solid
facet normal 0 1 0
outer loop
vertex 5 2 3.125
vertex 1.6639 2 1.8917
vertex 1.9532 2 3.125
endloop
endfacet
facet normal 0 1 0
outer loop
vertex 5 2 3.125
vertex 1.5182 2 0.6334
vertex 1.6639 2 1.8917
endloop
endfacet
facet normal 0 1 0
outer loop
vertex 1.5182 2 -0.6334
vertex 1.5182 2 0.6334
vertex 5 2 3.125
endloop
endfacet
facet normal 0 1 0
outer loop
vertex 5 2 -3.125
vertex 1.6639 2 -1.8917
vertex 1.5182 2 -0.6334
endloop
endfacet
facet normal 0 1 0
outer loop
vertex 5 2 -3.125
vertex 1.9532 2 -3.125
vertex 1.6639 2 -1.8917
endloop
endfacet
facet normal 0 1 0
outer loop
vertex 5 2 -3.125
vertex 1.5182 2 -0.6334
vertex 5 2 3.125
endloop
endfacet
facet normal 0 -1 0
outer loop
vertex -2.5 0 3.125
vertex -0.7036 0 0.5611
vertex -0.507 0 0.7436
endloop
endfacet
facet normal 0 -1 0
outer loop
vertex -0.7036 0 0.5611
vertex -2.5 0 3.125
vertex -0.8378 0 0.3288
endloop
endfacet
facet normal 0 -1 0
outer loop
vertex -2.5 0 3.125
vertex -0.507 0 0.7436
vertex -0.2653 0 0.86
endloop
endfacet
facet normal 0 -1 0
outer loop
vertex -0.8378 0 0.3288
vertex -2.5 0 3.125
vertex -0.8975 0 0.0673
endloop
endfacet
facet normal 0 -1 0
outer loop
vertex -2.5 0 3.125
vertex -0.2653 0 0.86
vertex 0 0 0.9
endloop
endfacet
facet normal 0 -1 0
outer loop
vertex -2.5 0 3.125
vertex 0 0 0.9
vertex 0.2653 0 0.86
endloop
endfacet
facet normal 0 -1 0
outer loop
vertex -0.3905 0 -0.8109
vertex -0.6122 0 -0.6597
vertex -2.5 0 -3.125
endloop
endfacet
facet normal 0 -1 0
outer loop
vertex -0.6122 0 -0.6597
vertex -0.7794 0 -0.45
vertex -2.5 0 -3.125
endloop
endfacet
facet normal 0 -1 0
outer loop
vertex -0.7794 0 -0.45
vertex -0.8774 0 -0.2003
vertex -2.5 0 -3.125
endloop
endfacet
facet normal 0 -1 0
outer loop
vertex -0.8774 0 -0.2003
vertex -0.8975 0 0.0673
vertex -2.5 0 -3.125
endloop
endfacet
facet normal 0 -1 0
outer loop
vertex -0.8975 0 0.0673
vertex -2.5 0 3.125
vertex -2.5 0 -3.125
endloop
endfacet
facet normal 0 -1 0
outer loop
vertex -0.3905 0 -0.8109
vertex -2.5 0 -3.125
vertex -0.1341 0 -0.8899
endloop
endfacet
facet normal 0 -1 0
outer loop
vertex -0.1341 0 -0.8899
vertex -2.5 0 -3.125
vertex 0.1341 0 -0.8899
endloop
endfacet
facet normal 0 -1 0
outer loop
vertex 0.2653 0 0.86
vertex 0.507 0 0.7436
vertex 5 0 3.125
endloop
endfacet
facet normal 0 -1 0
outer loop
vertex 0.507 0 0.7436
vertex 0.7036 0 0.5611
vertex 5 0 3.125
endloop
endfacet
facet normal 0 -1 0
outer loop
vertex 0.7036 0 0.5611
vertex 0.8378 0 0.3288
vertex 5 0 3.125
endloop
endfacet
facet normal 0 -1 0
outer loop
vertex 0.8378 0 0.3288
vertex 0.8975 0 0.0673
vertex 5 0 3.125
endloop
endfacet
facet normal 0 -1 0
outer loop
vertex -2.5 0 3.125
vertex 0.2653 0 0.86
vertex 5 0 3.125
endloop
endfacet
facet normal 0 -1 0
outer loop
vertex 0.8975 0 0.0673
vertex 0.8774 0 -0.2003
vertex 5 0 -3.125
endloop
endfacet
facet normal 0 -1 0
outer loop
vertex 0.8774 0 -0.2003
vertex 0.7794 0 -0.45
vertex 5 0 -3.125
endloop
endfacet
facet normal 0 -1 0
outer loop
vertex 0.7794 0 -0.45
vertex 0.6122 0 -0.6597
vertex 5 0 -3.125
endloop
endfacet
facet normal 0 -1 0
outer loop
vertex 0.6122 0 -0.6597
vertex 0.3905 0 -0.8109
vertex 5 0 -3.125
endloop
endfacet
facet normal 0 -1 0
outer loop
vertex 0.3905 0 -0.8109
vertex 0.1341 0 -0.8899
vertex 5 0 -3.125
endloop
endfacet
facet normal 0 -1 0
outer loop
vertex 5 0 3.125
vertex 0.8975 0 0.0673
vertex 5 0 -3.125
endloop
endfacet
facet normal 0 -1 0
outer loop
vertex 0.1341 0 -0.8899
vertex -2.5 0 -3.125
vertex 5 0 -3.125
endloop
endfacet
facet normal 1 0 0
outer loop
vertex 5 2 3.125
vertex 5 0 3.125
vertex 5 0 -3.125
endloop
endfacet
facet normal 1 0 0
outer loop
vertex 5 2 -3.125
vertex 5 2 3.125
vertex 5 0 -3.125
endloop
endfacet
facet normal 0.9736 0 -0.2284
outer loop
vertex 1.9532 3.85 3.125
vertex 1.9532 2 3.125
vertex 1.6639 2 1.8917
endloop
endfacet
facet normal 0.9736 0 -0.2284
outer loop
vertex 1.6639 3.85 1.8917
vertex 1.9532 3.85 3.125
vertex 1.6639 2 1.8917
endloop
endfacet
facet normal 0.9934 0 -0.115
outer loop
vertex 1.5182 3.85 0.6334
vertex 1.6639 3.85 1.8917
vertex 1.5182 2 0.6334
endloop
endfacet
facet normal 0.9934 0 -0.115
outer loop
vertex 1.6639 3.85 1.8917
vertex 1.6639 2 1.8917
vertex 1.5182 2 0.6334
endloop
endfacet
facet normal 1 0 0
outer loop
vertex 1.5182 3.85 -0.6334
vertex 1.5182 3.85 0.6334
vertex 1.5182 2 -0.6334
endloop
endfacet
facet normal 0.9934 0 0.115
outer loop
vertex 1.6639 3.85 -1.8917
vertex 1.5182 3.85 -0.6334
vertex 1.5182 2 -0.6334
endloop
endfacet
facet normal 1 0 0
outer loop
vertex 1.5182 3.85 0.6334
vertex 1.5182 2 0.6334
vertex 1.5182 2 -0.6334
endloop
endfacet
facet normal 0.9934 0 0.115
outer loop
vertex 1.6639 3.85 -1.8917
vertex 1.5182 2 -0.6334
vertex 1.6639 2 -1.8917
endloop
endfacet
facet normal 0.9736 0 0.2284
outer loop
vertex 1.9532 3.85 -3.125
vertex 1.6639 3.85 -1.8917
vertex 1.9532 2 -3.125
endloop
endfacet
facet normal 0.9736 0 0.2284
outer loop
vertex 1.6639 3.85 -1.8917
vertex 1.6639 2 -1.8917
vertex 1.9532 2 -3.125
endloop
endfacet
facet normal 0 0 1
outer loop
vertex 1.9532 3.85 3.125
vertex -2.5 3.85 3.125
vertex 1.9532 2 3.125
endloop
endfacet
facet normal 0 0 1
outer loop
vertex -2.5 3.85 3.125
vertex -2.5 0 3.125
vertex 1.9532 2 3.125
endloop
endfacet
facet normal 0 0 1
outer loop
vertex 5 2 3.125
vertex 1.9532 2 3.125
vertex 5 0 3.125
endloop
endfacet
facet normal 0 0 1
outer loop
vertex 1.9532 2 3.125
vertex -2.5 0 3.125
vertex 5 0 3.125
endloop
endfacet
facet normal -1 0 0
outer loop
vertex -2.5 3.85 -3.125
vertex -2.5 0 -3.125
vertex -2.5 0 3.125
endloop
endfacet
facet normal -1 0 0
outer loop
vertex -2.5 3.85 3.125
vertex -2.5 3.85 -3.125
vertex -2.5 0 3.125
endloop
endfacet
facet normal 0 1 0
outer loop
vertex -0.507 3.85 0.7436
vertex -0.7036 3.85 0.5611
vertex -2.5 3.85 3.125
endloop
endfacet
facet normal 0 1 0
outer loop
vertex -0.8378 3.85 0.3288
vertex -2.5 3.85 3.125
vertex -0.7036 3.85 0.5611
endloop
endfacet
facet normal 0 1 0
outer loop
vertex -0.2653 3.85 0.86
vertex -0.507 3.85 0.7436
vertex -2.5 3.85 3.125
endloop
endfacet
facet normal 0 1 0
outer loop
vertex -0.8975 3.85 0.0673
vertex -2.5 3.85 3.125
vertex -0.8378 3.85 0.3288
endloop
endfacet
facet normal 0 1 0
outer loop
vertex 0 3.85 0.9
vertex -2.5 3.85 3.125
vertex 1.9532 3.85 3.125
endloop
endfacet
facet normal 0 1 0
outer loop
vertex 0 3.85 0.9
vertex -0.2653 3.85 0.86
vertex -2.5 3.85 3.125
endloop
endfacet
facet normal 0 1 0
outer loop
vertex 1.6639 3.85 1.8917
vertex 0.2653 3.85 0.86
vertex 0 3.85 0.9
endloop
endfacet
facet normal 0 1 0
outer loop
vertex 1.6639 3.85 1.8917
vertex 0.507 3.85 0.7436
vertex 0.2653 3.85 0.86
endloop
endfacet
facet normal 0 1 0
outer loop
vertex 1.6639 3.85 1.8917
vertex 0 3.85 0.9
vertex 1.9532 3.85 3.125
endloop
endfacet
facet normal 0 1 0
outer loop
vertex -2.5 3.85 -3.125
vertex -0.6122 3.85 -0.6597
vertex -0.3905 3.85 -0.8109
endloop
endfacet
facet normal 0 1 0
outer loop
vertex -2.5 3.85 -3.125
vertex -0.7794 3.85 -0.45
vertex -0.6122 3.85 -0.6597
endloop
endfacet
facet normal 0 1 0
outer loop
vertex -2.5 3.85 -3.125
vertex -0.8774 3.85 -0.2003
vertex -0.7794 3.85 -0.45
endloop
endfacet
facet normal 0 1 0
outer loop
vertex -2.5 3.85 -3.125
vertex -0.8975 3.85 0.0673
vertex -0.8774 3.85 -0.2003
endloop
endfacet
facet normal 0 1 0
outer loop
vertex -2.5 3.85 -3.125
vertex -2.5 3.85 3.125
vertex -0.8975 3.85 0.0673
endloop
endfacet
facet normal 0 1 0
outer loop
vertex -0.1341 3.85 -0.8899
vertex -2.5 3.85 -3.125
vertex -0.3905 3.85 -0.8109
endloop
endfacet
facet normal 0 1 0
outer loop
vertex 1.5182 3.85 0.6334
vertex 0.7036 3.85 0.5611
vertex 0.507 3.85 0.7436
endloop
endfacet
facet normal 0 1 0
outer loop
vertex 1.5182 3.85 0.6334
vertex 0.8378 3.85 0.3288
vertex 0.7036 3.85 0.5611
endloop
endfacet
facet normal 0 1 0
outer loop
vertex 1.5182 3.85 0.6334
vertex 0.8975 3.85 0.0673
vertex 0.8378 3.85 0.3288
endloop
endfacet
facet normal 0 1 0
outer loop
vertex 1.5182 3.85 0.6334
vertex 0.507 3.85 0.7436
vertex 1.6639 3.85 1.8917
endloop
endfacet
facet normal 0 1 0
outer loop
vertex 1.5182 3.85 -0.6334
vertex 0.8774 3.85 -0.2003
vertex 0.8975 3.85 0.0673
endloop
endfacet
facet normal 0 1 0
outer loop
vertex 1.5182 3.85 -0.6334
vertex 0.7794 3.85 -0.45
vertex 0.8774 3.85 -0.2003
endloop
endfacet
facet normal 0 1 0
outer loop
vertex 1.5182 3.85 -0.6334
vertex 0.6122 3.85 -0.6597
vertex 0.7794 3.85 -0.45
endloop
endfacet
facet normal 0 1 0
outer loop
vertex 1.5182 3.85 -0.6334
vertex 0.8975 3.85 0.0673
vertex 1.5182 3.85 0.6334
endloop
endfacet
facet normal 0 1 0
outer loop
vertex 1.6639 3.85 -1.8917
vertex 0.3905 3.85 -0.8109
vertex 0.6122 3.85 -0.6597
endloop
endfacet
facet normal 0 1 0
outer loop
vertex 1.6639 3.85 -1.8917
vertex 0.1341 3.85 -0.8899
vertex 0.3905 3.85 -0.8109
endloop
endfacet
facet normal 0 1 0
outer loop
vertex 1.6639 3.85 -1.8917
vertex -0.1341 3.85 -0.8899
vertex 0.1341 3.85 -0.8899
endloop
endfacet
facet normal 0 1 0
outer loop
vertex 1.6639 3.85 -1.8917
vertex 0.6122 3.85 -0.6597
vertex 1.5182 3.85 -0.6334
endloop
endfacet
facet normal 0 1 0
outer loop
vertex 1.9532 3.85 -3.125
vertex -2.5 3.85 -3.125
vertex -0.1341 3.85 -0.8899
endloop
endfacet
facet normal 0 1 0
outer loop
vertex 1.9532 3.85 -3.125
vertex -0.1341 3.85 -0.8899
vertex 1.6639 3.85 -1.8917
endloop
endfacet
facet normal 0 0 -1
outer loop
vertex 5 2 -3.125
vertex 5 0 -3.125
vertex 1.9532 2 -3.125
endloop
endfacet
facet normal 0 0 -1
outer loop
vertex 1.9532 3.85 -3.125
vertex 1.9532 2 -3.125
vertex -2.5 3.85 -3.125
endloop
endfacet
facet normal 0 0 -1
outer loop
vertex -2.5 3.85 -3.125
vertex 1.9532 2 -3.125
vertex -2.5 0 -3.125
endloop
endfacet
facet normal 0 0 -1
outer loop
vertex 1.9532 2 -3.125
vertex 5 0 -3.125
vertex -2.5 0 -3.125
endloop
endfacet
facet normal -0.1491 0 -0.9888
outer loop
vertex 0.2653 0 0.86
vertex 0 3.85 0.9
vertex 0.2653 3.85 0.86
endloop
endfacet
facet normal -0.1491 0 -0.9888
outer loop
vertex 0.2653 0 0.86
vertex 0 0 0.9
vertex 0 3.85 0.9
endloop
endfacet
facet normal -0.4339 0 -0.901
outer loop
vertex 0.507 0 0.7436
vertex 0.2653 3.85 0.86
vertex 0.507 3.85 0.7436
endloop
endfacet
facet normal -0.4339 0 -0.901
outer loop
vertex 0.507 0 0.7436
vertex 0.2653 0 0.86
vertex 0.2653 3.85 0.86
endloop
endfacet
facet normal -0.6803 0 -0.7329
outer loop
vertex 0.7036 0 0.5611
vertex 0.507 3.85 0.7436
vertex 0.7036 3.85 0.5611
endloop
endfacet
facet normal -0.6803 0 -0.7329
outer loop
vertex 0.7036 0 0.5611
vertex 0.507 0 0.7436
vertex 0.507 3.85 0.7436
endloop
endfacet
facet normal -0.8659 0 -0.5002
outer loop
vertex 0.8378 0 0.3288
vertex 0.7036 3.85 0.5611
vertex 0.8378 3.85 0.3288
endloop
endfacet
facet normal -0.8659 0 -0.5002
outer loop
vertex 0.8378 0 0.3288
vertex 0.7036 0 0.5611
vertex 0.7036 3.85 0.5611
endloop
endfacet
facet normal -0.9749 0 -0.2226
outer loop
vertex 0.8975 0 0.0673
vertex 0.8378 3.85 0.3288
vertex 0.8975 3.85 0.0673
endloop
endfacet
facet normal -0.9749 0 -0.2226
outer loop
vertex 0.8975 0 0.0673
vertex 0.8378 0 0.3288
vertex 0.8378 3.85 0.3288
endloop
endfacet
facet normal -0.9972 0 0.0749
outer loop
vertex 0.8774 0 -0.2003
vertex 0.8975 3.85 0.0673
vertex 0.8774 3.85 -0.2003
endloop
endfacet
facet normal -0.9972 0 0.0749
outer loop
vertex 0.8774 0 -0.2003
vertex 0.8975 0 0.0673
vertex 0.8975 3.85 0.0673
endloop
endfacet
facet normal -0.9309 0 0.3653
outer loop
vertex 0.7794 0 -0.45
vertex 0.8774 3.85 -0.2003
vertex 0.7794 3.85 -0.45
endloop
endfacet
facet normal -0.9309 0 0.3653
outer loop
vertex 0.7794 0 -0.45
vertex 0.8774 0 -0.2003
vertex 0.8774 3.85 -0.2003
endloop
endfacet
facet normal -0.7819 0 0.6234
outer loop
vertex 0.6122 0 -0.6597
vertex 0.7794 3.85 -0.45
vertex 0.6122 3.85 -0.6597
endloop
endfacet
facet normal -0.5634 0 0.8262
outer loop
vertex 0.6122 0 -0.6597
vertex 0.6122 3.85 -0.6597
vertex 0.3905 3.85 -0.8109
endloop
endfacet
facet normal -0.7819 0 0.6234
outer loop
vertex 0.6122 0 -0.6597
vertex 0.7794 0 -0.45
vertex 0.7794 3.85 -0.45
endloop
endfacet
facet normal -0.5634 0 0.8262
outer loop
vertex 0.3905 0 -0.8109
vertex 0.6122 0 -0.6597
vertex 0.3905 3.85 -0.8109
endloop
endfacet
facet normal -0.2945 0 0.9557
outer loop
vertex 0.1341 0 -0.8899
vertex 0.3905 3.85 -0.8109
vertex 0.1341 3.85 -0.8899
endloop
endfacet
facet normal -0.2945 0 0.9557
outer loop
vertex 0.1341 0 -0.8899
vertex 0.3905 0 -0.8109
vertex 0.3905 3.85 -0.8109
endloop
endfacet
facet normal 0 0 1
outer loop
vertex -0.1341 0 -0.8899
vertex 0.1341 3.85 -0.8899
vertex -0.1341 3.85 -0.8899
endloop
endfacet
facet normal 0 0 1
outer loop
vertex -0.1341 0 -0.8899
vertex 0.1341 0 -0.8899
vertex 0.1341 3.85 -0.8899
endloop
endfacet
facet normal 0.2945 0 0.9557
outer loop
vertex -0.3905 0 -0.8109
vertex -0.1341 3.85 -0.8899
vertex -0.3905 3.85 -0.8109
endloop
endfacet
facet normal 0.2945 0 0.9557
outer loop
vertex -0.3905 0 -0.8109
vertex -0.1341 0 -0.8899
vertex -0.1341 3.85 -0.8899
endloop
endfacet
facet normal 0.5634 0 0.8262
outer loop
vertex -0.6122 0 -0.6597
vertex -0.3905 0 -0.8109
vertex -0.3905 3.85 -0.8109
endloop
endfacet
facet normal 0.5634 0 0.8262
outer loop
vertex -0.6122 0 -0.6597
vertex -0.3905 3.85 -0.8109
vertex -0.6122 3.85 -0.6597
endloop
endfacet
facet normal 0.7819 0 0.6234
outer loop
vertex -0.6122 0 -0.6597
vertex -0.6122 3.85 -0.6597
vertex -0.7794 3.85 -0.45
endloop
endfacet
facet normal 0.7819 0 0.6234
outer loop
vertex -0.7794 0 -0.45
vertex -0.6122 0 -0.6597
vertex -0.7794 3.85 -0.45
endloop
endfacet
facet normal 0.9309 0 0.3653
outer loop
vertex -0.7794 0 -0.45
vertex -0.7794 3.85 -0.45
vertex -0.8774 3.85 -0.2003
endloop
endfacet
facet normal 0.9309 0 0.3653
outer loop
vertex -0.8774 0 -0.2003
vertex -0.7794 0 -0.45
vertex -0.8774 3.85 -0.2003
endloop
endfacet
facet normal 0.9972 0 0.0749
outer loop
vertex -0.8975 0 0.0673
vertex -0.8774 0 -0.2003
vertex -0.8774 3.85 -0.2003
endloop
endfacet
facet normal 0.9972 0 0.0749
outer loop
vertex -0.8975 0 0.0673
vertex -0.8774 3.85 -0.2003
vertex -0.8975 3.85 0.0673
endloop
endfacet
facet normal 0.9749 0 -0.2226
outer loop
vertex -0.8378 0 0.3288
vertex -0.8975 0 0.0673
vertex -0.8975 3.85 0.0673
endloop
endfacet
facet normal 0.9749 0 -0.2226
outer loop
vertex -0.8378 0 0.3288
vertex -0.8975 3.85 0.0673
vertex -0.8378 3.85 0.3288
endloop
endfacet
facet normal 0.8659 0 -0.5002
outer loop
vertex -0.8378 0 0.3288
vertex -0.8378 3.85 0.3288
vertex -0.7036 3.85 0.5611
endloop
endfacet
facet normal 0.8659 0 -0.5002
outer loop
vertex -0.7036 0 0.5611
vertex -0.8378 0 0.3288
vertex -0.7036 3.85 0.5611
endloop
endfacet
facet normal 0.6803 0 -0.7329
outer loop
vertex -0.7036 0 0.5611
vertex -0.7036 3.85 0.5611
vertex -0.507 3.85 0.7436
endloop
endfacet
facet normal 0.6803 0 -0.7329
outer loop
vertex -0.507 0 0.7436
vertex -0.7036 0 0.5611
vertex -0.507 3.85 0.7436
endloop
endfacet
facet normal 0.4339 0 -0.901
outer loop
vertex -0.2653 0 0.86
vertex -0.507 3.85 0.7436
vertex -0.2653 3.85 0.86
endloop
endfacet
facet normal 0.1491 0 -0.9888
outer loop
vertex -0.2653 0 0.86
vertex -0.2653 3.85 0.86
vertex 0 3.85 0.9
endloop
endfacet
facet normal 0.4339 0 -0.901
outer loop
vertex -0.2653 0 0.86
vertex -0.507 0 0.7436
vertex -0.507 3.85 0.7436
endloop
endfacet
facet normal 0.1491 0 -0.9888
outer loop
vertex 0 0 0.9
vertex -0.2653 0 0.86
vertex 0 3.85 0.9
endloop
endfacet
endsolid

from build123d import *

# Parameters (mm, degrees)
SKETCH3_W           = 7.5
SKETCH3_H           = 6.25
SKETCH3_R           = 0.9
BOSS_EXTRUDE1_DEPTH = 2
SKETCH6_R           = 0.9
BOSS_EXTRUDE3_DEPTH = 1.85


with BuildPart() as part:
    # Sketch3 → Boss-Extrude1 (new body)
    with BuildSketch(Plane(origin=(0, 0, 0), x_dir=(1, 0, 0), z_dir=(0, 1, 0))):
        with Locations((1.25, 0)):
            Rectangle(SKETCH3_W, SKETCH3_H)
        with Locations(Location((0, 0, 0), (0, 0, 270))):
            Circle(SKETCH3_R, mode=Mode.SUBTRACT)
    extrude(amount=BOSS_EXTRUDE1_DEPTH)

    # Sketch6 → Boss-Extrude3 (add)
    with BuildSketch(Plane(origin=(0, 2, 0), x_dir=(1, 0, 0), z_dir=(0, 1, 0))):
        with BuildLine():
            Line((-2.5, 3.125), (-2.5, -3.125))
            Line((-2.5, -3.125), (1.953229167, -3.125))
            ThreePointArc((1.953229167, -3.125), (1.5, 0), (1.953229167, 3.125))
            Line((1.953229167, 3.125), (-2.5, 3.125))
        make_face()
        with Locations(Location((0, 0, 0), (0, 0, 270))):
            Circle(SKETCH6_R, mode=Mode.SUBTRACT)
    extrude(amount=BOSS_EXTRUDE3_DEPTH)


solid = part.part
